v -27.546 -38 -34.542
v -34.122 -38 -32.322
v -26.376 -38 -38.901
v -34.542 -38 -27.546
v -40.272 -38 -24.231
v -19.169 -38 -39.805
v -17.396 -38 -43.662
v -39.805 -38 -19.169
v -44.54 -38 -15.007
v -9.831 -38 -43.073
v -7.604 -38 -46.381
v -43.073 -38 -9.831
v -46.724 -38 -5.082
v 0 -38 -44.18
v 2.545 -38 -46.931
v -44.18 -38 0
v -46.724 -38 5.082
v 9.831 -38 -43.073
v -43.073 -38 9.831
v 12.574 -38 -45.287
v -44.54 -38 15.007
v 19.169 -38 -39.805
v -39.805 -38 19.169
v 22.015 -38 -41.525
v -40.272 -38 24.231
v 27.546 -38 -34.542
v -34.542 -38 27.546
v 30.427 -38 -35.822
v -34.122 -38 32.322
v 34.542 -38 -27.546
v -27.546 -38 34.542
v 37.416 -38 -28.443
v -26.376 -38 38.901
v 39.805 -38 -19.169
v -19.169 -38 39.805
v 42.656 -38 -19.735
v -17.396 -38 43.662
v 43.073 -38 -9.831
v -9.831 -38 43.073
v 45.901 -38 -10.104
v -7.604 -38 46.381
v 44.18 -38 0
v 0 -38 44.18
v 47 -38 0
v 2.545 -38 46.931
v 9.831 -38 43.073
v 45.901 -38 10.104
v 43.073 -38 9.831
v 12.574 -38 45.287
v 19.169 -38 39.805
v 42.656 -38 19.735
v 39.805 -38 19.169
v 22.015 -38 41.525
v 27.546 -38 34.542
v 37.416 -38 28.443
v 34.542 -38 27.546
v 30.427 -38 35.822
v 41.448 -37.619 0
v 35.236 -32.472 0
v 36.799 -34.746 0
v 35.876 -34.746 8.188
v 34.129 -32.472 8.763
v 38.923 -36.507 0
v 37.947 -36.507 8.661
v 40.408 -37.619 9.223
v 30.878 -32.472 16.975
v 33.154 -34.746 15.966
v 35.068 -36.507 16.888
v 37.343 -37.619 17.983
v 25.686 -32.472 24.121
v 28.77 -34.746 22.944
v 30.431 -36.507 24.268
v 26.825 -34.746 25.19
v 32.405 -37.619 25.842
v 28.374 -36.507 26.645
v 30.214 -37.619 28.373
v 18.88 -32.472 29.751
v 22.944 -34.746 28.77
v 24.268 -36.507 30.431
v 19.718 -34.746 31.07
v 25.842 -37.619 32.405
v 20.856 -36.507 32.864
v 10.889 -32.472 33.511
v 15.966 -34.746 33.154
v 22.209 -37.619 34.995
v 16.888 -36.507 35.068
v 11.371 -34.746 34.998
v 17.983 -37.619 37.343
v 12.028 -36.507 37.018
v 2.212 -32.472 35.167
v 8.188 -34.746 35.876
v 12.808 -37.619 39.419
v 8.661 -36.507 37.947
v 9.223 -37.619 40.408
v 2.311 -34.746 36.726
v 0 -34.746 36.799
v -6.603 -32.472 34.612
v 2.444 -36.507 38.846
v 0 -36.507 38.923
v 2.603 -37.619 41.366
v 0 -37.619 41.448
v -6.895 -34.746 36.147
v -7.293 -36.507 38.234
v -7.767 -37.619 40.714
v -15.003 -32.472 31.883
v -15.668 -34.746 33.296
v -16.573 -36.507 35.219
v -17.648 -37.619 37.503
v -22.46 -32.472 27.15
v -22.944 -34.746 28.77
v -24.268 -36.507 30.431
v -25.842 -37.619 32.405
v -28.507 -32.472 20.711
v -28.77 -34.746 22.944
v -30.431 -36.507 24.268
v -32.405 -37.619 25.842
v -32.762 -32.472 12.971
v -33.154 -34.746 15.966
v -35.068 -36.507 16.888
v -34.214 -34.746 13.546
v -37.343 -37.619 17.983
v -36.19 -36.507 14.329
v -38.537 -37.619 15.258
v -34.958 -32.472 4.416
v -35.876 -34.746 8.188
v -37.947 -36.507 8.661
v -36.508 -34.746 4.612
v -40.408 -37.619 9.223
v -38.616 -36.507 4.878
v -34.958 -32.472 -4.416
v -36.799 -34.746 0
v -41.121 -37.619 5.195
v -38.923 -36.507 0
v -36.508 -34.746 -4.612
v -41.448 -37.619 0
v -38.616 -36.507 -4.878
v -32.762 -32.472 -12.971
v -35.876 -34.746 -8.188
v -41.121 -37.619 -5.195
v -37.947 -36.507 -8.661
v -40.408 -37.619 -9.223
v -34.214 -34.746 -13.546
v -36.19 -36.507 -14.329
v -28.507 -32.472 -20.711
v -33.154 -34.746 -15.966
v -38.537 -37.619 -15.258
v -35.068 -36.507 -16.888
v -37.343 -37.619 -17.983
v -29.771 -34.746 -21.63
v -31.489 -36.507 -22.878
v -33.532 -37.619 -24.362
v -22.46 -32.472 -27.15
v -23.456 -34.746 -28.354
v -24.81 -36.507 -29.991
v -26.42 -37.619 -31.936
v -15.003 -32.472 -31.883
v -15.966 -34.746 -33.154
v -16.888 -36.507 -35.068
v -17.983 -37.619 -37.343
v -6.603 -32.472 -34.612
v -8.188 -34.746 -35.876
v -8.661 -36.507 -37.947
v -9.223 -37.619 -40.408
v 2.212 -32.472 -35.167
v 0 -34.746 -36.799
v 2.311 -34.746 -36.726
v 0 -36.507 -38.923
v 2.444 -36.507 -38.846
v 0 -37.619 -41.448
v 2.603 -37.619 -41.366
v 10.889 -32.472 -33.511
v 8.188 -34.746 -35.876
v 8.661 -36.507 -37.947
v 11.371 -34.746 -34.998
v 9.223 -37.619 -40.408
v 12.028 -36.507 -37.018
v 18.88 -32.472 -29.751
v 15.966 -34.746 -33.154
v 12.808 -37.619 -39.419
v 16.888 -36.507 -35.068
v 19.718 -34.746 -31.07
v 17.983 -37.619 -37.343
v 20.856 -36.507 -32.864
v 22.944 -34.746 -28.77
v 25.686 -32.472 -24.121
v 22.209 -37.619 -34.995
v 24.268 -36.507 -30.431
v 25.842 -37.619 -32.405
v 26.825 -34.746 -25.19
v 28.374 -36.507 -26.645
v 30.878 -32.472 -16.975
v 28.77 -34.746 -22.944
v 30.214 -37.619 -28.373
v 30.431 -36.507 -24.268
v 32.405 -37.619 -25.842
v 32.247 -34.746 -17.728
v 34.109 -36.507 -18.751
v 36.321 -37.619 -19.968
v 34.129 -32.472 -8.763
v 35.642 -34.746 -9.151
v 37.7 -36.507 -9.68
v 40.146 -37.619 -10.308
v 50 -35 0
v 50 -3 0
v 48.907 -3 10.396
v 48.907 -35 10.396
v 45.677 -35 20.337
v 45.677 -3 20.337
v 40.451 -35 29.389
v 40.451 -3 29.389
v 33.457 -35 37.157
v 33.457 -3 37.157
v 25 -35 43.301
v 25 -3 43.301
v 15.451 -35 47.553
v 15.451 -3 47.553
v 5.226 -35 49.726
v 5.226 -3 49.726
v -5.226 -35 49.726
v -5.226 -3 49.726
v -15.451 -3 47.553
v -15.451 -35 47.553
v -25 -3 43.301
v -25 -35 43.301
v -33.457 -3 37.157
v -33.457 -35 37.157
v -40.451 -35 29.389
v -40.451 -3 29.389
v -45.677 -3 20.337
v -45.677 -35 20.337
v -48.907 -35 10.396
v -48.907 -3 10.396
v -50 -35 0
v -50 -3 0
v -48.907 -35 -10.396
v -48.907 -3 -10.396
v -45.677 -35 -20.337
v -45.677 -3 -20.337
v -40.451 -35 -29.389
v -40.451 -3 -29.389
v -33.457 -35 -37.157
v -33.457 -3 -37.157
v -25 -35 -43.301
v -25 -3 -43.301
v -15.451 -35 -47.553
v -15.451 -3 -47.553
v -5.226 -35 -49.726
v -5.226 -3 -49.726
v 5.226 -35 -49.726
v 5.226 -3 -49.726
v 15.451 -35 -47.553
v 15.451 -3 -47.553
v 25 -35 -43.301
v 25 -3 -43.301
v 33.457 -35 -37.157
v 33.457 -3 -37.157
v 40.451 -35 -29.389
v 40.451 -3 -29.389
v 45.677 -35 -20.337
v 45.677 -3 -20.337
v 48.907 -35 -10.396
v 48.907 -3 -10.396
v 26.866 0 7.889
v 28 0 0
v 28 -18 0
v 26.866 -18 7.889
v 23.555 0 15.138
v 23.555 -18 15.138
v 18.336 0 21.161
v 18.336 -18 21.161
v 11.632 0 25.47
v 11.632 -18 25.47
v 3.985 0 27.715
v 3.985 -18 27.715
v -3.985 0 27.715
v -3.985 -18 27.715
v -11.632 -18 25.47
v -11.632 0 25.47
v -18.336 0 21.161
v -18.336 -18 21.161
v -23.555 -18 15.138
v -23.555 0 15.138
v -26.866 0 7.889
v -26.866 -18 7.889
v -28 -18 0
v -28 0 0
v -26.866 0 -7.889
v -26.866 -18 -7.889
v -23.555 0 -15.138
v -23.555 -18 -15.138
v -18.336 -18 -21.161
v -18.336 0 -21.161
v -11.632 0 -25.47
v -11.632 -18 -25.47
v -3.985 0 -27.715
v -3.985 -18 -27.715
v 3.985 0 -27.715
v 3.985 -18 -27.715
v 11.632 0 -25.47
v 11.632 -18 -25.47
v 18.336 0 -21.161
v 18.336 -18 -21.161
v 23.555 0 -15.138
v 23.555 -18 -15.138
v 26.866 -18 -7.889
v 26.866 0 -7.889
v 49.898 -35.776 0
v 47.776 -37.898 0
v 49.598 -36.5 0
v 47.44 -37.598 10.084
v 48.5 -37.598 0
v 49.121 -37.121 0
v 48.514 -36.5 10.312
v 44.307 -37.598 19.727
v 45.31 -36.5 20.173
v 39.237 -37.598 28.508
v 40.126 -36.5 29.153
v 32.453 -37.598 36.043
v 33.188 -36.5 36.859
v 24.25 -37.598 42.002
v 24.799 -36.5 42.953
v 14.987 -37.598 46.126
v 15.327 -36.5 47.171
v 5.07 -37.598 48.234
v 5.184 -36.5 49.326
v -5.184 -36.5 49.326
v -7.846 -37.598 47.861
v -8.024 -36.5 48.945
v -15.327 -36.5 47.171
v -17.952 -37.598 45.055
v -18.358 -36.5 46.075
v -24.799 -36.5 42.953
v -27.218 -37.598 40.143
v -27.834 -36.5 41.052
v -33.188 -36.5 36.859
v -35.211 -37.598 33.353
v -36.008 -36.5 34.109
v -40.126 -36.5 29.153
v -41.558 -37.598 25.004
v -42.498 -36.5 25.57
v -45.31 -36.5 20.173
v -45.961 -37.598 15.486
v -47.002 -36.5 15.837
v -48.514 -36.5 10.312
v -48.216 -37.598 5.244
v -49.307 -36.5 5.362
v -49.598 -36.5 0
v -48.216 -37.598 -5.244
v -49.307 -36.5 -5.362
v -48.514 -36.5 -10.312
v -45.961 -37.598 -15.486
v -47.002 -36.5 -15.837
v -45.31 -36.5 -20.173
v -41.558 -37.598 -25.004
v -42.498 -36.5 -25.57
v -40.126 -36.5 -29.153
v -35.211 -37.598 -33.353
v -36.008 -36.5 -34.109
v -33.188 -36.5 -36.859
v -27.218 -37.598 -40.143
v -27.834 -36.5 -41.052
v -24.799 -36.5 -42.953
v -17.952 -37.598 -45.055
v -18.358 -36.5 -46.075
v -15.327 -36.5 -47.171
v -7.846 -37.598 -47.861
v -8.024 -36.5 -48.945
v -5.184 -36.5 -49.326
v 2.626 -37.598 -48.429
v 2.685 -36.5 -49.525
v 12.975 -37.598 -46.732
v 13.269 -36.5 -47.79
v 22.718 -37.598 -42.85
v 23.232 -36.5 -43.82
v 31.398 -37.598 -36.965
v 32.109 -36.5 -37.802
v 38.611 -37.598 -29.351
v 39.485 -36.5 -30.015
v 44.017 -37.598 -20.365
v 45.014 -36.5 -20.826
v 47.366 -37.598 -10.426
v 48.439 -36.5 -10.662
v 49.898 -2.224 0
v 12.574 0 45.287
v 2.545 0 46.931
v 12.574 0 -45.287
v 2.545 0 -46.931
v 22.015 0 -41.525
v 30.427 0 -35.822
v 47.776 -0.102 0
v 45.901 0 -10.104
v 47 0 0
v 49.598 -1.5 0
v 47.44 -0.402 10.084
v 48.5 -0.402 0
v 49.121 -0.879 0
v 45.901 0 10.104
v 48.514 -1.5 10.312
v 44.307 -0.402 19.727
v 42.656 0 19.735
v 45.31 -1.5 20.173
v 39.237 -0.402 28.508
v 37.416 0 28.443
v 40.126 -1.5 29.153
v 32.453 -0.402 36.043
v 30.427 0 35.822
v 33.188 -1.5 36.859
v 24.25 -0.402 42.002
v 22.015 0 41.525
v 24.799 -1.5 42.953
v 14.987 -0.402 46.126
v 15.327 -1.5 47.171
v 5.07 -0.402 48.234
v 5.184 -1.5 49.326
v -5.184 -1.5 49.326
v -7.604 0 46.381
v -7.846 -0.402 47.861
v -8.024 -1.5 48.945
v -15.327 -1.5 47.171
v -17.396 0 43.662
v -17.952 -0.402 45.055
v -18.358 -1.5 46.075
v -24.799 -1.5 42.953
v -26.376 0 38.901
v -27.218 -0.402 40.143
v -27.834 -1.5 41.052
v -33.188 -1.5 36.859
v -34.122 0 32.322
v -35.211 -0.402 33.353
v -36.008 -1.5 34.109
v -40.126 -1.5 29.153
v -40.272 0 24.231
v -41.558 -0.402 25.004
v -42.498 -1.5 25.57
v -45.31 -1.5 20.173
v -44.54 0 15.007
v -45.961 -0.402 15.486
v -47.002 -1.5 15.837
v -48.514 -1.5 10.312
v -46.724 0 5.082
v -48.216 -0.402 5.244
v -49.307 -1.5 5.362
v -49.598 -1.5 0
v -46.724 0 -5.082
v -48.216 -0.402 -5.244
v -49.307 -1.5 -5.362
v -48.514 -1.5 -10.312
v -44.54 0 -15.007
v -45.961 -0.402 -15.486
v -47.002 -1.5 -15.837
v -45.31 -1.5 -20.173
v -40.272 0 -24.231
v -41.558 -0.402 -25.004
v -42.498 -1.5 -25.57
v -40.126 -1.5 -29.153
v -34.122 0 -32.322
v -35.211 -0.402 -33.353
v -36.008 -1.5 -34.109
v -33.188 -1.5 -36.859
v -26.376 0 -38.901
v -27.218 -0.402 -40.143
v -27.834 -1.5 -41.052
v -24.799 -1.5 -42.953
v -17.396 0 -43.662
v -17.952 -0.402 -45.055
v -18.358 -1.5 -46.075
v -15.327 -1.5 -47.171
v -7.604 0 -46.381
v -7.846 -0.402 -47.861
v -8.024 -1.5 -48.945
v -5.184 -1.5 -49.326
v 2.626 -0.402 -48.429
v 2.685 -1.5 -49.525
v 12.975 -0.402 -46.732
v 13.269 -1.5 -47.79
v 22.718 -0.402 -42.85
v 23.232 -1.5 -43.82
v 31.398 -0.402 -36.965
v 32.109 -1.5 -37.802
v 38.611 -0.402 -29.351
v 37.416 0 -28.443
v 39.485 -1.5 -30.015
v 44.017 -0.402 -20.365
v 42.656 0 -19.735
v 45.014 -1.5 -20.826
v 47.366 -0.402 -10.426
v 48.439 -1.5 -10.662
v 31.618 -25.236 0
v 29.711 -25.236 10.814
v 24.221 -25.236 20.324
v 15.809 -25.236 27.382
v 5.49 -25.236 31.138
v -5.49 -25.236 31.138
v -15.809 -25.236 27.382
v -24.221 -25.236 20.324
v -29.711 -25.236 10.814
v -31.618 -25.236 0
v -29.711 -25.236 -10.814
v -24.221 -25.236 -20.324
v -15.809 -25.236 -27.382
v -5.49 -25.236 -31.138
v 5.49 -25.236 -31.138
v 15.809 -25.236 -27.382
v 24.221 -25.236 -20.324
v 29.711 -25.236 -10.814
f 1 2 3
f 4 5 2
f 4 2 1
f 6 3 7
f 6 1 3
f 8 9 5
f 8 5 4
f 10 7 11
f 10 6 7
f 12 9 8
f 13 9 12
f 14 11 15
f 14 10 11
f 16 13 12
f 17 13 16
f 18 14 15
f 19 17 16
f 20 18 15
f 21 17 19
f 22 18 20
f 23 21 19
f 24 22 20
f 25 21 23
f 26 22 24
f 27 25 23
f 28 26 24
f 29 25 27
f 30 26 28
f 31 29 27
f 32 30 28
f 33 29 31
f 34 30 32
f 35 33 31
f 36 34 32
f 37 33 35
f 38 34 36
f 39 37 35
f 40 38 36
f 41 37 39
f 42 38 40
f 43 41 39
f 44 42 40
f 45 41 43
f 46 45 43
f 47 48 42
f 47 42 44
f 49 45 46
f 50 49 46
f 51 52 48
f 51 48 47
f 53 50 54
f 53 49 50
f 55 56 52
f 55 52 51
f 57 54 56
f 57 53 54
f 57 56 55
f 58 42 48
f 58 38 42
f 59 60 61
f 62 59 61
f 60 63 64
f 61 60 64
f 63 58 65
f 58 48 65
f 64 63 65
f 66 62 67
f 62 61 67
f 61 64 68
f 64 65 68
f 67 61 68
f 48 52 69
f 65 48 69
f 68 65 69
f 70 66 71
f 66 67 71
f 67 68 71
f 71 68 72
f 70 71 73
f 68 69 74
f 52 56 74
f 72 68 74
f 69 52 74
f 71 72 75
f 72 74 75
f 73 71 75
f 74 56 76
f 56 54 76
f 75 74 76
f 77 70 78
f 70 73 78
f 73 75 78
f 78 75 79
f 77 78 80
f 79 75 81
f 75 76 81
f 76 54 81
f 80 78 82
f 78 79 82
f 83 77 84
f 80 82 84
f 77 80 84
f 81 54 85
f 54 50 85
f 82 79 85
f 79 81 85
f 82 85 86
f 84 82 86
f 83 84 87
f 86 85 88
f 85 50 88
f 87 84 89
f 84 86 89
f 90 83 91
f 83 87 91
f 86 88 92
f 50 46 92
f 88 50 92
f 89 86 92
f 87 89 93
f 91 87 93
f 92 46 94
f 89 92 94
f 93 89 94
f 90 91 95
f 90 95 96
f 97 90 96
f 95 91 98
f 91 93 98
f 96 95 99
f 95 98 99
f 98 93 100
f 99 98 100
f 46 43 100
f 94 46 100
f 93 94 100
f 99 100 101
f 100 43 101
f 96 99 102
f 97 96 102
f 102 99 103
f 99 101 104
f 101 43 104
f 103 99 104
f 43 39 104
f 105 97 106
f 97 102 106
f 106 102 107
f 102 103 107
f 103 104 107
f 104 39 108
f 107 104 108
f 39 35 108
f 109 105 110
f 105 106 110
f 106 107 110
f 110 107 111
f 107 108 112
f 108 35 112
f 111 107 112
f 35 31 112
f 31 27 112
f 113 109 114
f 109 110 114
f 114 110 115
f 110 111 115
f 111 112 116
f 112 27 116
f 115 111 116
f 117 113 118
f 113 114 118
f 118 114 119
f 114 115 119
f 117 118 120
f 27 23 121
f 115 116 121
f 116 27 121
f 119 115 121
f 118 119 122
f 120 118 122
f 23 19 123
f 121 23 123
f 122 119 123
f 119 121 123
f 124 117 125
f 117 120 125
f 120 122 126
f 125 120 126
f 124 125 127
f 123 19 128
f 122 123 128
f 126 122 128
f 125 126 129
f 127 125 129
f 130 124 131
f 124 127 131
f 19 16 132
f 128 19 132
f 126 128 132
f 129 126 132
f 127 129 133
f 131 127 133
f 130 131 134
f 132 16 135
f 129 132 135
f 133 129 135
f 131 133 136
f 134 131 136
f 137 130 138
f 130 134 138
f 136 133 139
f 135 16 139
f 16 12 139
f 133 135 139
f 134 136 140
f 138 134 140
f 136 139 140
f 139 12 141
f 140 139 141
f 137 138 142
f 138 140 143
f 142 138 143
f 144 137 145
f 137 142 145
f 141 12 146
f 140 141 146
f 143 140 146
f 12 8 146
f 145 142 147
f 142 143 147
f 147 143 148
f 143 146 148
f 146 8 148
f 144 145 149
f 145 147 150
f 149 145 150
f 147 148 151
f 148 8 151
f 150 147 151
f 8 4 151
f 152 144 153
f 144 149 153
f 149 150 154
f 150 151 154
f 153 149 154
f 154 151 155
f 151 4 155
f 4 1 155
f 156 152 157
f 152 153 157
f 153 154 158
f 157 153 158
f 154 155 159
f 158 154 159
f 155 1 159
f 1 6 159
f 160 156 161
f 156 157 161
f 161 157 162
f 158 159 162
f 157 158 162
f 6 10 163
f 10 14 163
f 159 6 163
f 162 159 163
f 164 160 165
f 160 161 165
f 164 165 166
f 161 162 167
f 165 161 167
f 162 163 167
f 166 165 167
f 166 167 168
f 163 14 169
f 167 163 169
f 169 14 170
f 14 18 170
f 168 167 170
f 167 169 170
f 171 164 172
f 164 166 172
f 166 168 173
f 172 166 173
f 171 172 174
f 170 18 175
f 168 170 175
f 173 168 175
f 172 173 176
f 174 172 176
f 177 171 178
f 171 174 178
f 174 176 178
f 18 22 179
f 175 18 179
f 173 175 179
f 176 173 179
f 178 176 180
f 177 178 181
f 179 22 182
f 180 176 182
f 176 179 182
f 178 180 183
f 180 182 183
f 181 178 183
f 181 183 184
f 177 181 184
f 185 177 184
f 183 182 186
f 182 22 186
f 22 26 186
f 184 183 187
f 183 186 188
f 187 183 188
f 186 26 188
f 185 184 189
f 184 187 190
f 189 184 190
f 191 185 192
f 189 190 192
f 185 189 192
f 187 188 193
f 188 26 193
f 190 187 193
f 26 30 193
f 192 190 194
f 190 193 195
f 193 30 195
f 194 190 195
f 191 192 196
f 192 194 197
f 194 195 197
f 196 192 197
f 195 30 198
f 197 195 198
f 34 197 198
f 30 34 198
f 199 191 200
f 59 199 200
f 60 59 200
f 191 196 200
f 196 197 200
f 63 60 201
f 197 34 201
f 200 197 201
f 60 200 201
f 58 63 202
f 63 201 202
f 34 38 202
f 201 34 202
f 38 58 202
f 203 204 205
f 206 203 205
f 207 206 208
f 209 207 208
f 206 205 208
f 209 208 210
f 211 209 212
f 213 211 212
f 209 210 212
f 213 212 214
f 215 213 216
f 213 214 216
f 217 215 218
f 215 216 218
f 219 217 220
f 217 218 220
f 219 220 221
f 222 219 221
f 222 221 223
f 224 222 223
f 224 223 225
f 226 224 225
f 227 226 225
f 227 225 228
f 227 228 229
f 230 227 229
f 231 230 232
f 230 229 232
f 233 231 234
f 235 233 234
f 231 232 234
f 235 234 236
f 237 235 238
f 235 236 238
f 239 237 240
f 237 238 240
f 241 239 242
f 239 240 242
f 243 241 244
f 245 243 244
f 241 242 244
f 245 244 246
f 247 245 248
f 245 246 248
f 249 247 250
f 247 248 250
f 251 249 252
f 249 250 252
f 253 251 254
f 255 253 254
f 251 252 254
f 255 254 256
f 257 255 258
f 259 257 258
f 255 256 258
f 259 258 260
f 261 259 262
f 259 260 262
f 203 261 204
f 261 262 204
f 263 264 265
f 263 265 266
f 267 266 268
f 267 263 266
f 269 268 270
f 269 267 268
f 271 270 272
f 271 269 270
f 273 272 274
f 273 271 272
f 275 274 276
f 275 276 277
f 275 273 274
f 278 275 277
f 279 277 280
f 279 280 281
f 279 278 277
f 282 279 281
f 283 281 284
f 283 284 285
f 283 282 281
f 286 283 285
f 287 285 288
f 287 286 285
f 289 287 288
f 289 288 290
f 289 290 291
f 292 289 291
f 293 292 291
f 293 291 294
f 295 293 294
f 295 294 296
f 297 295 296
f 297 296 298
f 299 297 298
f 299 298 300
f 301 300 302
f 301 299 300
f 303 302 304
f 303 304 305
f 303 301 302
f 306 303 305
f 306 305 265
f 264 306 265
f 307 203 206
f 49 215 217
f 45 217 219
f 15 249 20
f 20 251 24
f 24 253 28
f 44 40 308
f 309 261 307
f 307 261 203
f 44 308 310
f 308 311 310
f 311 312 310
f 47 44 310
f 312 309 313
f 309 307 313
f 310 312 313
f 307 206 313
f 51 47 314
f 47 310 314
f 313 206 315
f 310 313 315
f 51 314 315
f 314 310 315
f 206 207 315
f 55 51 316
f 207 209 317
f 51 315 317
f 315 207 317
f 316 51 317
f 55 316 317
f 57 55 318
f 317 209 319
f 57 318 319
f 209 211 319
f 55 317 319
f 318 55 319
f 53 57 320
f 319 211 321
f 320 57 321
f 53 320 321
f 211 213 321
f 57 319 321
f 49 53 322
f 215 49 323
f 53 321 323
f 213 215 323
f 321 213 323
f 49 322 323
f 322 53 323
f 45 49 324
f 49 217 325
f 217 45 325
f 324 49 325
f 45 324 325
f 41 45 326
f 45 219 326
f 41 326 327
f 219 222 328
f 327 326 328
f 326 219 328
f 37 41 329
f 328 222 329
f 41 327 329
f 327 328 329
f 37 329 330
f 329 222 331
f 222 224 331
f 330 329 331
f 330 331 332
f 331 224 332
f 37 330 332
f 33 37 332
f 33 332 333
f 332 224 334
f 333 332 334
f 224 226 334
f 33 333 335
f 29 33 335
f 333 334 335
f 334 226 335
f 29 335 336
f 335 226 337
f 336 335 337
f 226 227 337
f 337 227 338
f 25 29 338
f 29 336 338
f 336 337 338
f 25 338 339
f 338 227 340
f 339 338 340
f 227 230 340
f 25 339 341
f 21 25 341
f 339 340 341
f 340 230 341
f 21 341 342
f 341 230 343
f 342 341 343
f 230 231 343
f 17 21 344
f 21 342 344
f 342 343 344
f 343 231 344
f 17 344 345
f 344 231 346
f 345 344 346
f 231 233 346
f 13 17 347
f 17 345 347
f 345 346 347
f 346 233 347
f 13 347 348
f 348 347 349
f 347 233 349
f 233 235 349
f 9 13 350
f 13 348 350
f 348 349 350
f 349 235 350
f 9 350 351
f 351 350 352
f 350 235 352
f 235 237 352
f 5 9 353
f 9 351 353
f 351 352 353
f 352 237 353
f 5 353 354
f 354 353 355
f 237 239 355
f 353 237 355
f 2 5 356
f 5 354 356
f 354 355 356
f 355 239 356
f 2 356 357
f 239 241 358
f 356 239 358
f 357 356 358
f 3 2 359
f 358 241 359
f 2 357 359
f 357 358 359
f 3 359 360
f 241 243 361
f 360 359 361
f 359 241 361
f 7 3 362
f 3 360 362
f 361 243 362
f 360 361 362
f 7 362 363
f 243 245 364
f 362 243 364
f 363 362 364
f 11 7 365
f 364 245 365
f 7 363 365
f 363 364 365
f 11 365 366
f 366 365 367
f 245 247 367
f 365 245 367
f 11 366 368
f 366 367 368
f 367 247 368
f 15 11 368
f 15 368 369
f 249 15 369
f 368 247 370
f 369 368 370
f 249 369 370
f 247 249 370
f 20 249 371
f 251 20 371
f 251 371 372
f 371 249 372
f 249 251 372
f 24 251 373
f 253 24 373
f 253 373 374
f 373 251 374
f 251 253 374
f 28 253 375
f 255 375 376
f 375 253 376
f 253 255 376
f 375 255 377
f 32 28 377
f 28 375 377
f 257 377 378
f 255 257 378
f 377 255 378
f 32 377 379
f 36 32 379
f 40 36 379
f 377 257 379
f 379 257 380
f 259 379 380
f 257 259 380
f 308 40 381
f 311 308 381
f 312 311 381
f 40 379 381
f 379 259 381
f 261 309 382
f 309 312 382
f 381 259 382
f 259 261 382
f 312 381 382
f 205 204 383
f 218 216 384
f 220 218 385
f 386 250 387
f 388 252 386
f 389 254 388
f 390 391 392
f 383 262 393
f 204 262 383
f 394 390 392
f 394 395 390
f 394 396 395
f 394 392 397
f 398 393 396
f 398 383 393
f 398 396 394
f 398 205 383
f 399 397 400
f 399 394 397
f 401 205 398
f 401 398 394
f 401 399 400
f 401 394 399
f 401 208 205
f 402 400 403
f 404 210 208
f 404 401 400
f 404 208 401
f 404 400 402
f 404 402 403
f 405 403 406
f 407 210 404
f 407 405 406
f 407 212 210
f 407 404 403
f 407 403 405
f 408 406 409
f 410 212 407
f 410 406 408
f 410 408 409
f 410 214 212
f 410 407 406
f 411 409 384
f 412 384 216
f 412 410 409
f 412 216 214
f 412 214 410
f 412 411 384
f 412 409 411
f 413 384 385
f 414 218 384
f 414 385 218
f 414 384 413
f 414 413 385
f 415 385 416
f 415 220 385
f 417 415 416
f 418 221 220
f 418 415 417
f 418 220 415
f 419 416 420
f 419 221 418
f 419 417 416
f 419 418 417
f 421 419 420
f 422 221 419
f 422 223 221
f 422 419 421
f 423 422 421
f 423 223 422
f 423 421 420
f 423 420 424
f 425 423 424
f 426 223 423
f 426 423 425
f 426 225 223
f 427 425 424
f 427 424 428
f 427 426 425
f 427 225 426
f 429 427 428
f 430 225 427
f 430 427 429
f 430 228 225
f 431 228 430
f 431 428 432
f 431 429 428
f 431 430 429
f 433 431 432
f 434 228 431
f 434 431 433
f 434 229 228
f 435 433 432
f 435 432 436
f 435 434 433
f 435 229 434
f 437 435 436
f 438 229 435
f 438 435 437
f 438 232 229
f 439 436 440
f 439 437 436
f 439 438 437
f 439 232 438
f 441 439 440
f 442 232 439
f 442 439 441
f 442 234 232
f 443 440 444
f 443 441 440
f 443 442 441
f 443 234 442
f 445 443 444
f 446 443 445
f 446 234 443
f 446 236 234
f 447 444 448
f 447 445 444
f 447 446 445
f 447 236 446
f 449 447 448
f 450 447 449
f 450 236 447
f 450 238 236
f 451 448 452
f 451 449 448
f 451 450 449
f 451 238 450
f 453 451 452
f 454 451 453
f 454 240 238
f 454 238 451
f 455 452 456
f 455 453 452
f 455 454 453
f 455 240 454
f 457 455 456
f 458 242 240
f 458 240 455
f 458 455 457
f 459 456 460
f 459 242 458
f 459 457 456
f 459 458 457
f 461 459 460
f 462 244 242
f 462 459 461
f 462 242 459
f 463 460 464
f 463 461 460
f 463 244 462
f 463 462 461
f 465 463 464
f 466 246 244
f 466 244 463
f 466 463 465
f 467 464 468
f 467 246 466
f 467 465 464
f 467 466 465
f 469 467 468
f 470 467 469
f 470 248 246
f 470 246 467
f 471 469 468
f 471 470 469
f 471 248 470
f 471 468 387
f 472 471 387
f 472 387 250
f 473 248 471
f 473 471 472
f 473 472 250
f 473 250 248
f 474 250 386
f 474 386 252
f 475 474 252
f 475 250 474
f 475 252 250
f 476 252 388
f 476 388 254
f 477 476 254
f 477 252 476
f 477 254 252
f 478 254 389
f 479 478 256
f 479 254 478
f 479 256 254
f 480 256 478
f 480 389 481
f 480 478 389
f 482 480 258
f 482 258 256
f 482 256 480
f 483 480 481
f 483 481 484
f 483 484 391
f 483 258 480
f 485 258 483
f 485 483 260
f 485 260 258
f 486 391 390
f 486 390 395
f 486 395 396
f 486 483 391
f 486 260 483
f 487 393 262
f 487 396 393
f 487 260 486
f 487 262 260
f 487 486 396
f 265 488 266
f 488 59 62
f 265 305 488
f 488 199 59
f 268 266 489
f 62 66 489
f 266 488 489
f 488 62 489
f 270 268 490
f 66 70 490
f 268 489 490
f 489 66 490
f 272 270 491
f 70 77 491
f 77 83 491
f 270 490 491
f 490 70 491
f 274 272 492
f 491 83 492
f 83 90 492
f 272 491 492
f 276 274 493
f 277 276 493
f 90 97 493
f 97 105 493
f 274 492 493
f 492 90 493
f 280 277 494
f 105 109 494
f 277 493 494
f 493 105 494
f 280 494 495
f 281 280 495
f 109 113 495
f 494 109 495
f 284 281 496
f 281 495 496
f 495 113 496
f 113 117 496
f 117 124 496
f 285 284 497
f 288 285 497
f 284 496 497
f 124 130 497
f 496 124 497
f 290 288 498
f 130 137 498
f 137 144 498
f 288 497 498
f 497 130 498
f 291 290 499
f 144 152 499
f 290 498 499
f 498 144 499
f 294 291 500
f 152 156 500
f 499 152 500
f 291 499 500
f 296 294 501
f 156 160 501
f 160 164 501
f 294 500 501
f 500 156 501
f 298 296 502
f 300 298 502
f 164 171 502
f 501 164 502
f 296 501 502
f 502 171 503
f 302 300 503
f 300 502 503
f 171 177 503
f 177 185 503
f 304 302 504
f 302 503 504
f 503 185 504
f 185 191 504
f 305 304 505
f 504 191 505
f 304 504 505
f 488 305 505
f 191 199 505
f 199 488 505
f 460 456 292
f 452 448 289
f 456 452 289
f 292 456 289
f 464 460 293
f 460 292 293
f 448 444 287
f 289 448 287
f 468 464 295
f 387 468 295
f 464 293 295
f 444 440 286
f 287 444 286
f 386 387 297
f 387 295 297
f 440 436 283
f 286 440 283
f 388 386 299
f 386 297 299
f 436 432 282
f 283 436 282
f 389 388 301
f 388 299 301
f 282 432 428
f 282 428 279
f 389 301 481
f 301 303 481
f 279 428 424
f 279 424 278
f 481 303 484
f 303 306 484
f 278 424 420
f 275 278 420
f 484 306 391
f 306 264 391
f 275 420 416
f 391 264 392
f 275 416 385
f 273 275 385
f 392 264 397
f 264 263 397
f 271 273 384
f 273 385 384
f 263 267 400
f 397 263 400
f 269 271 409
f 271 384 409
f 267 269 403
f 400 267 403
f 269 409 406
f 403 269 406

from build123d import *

# Parameters (mm, degrees)
F0_R     = 50
F0_R_2   = 28
F1_DEPTH = 38
F2_SIZE2 = 10
F2_SIZE  = 20
F3_R     = 10
F4_R     = 3


with BuildPart() as f1:
    # F0 (on Front) → F1 (new body)
    with BuildSketch(Plane.XZ):
        Circle(F0_R)
        Circle(F0_R_2, mode=Mode.SUBTRACT)
    extrude(amount=F1_DEPTH)

    # F2
    f2_edges = [f1.edges().sort_by_distance(p)[0] for p in [
        (-28, -38, 0),
    ]]
    f2_side = f1.faces().sort_by_distance((-28, -19, 0))[0]
    chamfer(f2_edges, length=F2_SIZE, length2=F2_SIZE2, reference=f2_side)

    # F3
    f3_edges = [f1.edges().sort_by_distance(p)[0] for p in [
        (-38, -38, 0),
    ]]
    fillet(f3_edges, radius=F3_R)

    # F4
    f4_edges = [f1.edges().sort_by_distance(p)[0] for p in [
        (-50, 0, 0),
        (-50, -38, 0),
    ]]
    fillet(f4_edges, radius=F4_R)


solid = f1.part
